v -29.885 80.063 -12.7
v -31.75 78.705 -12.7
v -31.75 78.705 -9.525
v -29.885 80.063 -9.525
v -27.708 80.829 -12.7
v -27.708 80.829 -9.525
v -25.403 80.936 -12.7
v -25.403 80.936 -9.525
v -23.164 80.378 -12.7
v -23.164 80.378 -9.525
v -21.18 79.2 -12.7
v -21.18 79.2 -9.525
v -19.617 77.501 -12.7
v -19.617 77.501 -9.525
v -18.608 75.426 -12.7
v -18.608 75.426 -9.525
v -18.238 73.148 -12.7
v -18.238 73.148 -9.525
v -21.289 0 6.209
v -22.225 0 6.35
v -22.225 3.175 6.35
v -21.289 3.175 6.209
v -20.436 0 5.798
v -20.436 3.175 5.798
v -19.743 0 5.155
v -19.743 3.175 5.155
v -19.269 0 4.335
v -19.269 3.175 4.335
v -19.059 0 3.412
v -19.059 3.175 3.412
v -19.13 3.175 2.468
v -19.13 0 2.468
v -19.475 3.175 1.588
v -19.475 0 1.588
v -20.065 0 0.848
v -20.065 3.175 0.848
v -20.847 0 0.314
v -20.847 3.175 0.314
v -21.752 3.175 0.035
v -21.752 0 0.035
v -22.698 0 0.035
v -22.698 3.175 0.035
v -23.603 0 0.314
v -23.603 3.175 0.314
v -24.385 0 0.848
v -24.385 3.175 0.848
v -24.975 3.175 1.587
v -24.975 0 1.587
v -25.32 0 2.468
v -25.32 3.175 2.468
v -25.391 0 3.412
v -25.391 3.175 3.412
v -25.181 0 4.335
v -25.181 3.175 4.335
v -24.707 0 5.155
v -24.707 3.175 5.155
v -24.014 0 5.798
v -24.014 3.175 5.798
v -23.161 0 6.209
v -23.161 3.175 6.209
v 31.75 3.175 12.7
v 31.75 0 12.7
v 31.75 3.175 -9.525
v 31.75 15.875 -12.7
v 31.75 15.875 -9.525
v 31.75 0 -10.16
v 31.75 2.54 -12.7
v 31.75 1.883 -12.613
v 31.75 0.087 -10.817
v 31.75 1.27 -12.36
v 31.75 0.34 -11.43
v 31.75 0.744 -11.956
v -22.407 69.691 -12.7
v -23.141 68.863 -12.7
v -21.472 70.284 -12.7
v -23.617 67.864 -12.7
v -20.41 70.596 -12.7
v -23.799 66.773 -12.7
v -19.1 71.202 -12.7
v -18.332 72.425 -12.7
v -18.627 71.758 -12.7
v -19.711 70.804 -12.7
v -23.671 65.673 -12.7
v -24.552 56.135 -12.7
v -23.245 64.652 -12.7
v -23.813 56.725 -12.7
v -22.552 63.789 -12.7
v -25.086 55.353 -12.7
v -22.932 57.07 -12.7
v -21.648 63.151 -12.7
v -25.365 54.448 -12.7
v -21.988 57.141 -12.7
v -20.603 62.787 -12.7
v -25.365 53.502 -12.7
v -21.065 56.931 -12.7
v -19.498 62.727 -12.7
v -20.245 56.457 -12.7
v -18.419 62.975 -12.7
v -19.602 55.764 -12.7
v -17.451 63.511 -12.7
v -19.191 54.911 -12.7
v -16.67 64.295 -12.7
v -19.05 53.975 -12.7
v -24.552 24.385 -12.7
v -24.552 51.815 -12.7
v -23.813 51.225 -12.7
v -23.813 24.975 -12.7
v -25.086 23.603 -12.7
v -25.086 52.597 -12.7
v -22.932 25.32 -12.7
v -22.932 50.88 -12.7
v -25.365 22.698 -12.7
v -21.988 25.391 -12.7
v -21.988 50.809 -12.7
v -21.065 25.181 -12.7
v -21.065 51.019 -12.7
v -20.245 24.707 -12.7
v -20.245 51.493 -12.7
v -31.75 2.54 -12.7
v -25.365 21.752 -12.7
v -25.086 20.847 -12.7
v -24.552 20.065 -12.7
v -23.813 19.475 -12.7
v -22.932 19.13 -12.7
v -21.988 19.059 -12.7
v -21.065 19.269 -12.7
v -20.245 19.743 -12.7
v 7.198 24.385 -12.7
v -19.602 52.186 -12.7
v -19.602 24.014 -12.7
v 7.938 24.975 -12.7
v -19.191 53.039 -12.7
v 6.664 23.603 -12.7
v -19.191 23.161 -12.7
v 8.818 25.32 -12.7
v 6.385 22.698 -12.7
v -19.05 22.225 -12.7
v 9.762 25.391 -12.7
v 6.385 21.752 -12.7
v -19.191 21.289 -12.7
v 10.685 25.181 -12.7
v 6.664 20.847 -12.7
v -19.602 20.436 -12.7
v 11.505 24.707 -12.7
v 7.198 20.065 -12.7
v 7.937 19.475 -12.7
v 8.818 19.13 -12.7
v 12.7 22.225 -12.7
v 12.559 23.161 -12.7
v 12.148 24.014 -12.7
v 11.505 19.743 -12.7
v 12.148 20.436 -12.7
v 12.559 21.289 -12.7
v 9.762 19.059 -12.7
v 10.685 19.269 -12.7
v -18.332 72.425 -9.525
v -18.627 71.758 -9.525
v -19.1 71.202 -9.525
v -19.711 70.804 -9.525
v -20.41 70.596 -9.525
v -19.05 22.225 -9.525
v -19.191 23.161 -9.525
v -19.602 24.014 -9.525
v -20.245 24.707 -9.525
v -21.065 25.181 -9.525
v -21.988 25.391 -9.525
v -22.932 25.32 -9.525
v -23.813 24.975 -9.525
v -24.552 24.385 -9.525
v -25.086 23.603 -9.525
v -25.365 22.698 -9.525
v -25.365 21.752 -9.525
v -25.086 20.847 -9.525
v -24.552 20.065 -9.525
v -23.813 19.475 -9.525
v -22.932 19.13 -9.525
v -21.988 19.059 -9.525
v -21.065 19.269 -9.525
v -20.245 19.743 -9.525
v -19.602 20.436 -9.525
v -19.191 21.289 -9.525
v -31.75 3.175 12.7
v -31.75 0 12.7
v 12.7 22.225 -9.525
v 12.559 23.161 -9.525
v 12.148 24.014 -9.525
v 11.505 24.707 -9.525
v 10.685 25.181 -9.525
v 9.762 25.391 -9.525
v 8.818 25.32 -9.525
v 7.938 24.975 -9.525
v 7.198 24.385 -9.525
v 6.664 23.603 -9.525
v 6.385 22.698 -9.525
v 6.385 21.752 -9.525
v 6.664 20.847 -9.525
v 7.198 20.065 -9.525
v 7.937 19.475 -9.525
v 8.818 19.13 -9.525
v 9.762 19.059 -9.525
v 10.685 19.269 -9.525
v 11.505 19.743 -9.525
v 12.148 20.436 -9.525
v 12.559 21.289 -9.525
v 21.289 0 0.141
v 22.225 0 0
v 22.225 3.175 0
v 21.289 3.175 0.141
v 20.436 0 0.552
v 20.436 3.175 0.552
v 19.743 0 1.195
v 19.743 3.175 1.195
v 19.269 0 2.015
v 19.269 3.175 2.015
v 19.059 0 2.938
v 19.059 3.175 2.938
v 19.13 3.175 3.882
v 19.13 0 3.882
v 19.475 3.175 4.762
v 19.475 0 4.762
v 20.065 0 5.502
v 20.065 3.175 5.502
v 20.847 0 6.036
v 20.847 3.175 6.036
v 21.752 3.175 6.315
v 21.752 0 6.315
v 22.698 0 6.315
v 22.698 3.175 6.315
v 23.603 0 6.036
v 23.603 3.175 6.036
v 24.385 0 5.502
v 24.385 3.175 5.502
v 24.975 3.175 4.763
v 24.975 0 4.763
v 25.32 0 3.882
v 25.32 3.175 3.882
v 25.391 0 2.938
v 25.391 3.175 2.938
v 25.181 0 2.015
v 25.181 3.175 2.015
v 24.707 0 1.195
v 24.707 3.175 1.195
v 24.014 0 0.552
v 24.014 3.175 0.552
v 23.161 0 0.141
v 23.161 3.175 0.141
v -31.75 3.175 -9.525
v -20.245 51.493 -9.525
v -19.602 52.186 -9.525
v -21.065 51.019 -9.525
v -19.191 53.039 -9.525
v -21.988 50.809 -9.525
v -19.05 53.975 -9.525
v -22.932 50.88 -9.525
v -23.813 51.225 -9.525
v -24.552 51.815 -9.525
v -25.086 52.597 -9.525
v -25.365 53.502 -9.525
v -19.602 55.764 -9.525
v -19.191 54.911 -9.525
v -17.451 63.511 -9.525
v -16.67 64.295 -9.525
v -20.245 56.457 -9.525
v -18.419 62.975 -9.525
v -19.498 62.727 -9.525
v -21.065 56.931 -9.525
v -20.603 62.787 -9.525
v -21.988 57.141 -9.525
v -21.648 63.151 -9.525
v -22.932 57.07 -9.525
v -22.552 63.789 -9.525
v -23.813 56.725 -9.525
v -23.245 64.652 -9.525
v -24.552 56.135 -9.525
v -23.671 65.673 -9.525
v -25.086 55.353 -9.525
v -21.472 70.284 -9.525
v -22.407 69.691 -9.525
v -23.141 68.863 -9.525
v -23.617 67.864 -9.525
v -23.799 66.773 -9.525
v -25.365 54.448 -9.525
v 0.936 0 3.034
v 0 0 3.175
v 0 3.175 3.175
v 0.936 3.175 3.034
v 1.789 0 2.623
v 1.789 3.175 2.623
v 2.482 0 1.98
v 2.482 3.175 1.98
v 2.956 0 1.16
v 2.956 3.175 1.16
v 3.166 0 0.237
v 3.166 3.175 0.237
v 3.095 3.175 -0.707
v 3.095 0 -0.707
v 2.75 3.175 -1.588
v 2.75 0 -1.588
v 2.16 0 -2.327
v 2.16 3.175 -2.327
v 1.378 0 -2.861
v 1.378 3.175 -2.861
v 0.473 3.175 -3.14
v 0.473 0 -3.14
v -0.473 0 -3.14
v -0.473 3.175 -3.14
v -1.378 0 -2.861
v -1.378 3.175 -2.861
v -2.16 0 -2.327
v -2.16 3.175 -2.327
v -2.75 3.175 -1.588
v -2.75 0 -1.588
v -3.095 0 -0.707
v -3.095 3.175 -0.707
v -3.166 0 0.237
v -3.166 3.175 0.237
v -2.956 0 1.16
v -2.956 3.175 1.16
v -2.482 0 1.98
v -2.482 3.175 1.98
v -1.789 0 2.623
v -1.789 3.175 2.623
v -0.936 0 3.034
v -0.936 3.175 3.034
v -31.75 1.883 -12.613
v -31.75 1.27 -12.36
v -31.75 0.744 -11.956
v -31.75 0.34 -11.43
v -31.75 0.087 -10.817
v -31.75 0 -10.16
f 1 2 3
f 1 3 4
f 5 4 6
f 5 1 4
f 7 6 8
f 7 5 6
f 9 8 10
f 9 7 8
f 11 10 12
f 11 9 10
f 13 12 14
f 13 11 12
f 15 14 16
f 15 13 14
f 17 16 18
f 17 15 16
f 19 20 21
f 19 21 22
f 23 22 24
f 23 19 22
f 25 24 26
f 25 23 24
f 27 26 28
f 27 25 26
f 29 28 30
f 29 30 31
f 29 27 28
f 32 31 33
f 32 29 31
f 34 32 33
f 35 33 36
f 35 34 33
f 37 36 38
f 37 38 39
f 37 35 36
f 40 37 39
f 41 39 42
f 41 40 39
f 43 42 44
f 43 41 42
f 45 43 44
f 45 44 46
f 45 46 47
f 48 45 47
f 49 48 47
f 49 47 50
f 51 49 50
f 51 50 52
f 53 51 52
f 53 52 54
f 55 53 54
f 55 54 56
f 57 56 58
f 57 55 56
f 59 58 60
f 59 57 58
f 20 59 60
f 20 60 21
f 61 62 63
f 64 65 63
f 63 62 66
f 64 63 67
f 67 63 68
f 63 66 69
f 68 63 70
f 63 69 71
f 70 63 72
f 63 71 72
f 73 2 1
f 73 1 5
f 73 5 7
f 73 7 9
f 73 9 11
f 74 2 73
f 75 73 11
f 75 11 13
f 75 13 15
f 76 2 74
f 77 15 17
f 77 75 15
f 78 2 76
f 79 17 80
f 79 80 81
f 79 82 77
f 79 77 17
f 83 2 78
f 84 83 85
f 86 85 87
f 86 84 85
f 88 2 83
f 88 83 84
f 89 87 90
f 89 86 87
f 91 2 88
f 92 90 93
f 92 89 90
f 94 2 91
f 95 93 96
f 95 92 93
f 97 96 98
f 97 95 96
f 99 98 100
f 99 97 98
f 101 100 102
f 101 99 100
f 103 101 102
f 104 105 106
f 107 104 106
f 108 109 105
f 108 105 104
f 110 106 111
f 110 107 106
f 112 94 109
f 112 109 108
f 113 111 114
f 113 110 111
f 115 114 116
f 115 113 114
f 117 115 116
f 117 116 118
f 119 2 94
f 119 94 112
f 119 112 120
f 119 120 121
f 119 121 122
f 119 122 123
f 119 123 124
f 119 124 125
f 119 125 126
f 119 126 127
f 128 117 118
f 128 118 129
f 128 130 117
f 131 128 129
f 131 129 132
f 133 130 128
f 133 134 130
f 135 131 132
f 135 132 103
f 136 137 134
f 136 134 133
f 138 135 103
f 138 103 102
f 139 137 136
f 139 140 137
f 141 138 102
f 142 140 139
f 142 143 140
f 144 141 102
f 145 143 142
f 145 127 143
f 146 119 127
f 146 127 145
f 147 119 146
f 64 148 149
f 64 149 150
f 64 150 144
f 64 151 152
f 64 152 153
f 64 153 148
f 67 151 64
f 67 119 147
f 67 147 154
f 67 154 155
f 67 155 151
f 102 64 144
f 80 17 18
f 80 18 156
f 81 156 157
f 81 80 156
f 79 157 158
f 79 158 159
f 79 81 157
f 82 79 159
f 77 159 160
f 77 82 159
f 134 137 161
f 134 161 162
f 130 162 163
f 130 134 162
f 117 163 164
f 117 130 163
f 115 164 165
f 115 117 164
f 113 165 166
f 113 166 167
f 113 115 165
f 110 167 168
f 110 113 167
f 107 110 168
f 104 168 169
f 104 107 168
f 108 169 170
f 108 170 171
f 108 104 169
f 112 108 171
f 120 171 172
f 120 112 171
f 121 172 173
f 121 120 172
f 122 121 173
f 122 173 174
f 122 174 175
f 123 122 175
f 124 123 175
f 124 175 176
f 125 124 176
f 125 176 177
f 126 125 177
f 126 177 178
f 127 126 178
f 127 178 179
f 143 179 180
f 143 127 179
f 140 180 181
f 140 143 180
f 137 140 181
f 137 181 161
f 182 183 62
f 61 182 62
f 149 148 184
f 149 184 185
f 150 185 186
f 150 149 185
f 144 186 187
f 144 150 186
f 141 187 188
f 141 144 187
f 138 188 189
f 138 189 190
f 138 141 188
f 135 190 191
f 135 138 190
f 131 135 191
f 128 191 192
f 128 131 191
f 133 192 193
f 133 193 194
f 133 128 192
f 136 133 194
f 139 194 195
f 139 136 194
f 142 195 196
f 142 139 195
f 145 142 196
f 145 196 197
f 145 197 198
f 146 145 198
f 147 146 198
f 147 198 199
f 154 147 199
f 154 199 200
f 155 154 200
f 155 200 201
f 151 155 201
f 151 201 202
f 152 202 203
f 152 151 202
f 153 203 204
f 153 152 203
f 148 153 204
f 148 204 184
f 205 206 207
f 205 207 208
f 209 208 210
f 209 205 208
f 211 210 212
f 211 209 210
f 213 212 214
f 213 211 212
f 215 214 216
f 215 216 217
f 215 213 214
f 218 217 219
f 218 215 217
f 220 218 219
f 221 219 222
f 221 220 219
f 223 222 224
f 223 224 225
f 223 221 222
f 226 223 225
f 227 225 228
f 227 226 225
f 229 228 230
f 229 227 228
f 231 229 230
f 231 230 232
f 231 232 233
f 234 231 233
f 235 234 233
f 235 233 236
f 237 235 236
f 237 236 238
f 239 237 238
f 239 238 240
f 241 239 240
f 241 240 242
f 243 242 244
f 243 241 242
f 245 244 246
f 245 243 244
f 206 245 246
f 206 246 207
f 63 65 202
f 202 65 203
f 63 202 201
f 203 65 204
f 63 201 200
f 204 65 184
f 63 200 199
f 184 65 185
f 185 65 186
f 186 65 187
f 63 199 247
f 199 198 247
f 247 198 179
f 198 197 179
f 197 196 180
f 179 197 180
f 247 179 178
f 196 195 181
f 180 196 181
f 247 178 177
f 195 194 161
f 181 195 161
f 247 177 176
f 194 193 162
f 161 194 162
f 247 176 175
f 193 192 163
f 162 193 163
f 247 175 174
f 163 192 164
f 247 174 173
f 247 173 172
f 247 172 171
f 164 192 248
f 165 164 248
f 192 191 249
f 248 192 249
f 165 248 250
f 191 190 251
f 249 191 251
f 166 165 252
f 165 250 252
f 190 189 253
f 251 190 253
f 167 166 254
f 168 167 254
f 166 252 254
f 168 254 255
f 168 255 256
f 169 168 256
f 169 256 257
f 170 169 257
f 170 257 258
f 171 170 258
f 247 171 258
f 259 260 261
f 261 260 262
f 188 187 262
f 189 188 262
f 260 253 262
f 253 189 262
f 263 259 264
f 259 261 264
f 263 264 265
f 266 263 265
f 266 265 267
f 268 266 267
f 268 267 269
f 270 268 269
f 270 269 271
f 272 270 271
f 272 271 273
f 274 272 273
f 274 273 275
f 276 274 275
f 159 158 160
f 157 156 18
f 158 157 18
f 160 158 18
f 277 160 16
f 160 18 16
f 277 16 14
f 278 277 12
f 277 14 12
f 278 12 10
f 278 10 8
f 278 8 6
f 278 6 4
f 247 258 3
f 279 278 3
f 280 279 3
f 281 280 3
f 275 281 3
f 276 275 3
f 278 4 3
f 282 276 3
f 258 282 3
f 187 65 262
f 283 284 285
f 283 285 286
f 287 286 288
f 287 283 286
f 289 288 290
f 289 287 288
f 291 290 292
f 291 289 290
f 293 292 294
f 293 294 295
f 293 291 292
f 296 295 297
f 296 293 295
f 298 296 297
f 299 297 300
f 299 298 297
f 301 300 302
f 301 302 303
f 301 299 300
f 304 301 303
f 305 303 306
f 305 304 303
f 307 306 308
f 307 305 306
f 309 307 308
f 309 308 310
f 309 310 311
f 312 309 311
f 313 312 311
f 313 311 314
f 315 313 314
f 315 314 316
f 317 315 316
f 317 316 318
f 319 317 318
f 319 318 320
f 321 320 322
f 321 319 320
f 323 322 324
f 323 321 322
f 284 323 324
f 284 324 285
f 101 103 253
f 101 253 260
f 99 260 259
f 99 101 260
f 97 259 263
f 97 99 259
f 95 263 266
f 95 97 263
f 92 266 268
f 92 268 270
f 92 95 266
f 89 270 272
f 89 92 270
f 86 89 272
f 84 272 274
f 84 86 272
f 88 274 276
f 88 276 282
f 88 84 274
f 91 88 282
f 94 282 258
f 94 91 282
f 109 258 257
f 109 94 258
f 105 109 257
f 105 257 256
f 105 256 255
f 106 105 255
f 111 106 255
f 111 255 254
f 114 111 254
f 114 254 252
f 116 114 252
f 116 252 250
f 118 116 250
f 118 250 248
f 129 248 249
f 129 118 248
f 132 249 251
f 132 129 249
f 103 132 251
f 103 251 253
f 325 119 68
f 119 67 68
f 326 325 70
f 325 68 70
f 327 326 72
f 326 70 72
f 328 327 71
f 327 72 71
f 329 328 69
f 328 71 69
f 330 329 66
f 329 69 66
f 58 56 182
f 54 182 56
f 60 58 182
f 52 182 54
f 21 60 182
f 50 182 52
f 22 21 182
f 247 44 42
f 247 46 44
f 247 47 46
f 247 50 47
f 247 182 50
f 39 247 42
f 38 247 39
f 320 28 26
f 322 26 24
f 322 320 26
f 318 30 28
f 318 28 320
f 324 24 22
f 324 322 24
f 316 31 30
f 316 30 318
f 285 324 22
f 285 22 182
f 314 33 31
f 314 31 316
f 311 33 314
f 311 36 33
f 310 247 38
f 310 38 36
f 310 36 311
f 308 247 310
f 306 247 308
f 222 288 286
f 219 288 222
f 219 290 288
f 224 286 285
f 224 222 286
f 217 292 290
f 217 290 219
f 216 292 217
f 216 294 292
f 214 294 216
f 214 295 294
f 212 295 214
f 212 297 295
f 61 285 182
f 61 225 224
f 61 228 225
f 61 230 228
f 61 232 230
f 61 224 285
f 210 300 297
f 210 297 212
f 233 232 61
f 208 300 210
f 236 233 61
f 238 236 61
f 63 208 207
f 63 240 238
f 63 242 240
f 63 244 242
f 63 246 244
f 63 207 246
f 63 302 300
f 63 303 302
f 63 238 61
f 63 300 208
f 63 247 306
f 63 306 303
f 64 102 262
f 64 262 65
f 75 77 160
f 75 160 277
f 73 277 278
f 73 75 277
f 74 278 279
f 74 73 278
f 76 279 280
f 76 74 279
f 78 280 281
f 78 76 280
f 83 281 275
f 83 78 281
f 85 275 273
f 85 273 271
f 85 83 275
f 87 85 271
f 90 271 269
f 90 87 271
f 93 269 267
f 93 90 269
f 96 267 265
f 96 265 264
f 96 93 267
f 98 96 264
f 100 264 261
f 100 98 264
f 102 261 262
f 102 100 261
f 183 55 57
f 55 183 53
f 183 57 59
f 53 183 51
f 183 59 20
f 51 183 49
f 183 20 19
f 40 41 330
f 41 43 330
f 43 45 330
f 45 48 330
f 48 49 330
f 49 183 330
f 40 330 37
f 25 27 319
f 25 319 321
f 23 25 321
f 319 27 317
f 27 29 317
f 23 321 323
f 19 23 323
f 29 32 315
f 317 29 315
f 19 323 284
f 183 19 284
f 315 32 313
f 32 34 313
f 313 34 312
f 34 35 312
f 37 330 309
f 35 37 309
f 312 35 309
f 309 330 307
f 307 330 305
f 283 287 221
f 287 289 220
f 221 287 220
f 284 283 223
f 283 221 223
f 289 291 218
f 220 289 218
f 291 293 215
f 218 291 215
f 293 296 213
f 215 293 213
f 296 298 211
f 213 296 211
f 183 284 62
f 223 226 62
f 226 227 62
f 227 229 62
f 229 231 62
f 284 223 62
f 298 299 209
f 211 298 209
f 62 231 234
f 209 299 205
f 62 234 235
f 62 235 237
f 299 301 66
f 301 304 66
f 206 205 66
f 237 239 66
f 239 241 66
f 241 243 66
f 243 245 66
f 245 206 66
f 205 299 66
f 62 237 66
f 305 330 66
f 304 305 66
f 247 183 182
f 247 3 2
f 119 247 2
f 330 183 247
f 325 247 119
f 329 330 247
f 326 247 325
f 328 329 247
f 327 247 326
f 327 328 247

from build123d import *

# Parameters (mm, degrees)
SKETCH1_W           = 63.5
SKETCH1_H           = 25.4
SKETCH1_R           = 3.175
BOSS_EXTRUDE1_DEPTH = 3.175
SKETCH2_R           = 3.175
BOSS_EXTRUDE2_DEPTH = 3.175
FILLET2_R           = 2.54


with BuildPart() as part:
    # Sketch1 → Boss-Extrude1 (new body)
    with BuildSketch(Plane(origin=(0, 0, 0), x_dir=(1, 0, 0), z_dir=(0, 1, 0))):
        Rectangle(SKETCH1_W, SKETCH1_H)
        with Locations(Location((-22.225, -3.175, 0), (0, 0, 270))):
            Circle(SKETCH1_R, mode=Mode.SUBTRACT)
        with Locations(Location((0, 0, 0), (0, 0, 270))):
            Circle(SKETCH1_R, mode=Mode.SUBTRACT)
        with Locations(Location((22.225, -3.175, 0), (0, 0, 90))):
            Circle(SKETCH1_R, mode=Mode.SUBTRACT)
    extrude(amount=BOSS_EXTRUDE1_DEPTH)

    # Sketch2 → Boss-Extrude2 (add)
    with BuildSketch(Plane.XY.offset(-12.7)):
        with BuildLine():
            Line((-31.75, 0), (-31.75, 78.705067014))
            ThreePointArc((-31.75, 78.705067014), (-23.163673383, 80.377738088), (-18.238159017, 73.148482141))
            ThreePointArc((-18.238159017, 73.148482141), (-18.843460583, 71.462906002), (-20.410488317, 70.595737627))
            ThreePointArc((-20.410488317, 70.595737627), (-23.244591892, 64.65221549), (-16.669658329, 64.294658329))
            Line((-16.669658329, 64.294658329), (31.75, 15.875))
            Line((31.75, 15.875), (31.75, 0))
            Line((31.75, 0), (-31.75, 0))
        make_face()
        with Locations((-22.225, 53.975)):
            Circle(SKETCH2_R, mode=Mode.SUBTRACT)
        with Locations((-22.225, 22.225)):
            Circle(SKETCH2_R, mode=Mode.SUBTRACT)
        with Locations((9.525, 22.225)):
            Circle(SKETCH2_R, mode=Mode.SUBTRACT)
    extrude(amount=BOSS_EXTRUDE2_DEPTH)

    # Fillet2
    fillet2_edges = [part.edges().sort_by_distance(p)[0] for p in [
        (0, 0, -12.7),
    ]]
    fillet(fillet2_edges, radius=FILLET2_R)


solid = part.part
